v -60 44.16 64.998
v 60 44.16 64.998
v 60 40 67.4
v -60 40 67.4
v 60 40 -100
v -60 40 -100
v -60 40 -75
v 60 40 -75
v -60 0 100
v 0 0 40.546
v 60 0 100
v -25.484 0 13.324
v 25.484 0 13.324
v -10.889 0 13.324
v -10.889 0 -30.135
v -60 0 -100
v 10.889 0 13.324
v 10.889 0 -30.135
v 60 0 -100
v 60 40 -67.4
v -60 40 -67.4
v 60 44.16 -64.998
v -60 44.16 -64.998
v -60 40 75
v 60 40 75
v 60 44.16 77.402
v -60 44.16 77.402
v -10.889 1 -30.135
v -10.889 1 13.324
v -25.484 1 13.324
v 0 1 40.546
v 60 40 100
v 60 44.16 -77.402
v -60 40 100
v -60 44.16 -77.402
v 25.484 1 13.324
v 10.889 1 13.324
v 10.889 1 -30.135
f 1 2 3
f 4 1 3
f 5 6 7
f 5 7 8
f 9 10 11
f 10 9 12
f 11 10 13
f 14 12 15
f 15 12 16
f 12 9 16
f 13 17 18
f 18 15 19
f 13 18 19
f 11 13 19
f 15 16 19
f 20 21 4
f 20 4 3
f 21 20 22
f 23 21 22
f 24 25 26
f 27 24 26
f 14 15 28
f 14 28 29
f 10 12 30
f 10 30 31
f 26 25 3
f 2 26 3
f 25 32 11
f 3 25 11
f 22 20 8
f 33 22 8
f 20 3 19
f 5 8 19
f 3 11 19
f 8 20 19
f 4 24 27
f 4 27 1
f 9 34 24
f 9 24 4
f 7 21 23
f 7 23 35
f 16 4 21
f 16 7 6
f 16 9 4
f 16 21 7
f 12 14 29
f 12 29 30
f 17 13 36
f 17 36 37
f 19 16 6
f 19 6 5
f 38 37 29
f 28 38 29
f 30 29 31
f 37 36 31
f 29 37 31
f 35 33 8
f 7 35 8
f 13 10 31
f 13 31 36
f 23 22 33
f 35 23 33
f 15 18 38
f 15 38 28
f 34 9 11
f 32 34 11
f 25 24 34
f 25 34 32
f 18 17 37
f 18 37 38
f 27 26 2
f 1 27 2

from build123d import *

# Parameters (mm, degrees)
SKETCH1_W           = 120
SKETCH1_H           = 200
BOSS_EXTRUDE1_DEPTH = 40
BOSS_EXTRUDE2_DEPTH = 120
CUT_EXTRUDE2_DEPTH  = 1


with BuildPart() as part:
    # Sketch1 → Boss-Extrude1 (new body)
    with BuildSketch(Plane(origin=(0, 0, 0), x_dir=(1, 0, 0), z_dir=(0, 1, 0))):
        Rectangle(SKETCH1_W, SKETCH1_H)
    extrude(amount=BOSS_EXTRUDE1_DEPTH)

    # Sketch2 → Boss-Extrude2 (add)
    with BuildSketch(Plane(origin=(60, 0, 0), x_dir=(0, 0, -1), z_dir=(1, 0, 0))):
        Polygon((67.4, 40), (64.99822288, 44.16), (77.40177712, 44.16), (75, 40), align=None)
        Polygon((-75, 40), (-77.40177712, 44.16), (-64.99822288, 44.16), (-67.4, 40), align=None)
    extrude(amount=-BOSS_EXTRUDE2_DEPTH)

    # Sketch5 → Cut-Extrude2 (cut)
    with BuildSketch(Plane.XZ):
        Polygon((-10.888743303, -30.135074667), (-10.888743303, 13.324383252), (-25.483702069, 13.324383252), (0, 40.546241509), (25.483702069, 13.324383252), (10.888743303, 13.324383252), (10.888743303, -30.135074667), align=None)
    extrude(amount=-CUT_EXTRUDE2_DEPTH, mode=Mode.SUBTRACT)


solid = part.part
